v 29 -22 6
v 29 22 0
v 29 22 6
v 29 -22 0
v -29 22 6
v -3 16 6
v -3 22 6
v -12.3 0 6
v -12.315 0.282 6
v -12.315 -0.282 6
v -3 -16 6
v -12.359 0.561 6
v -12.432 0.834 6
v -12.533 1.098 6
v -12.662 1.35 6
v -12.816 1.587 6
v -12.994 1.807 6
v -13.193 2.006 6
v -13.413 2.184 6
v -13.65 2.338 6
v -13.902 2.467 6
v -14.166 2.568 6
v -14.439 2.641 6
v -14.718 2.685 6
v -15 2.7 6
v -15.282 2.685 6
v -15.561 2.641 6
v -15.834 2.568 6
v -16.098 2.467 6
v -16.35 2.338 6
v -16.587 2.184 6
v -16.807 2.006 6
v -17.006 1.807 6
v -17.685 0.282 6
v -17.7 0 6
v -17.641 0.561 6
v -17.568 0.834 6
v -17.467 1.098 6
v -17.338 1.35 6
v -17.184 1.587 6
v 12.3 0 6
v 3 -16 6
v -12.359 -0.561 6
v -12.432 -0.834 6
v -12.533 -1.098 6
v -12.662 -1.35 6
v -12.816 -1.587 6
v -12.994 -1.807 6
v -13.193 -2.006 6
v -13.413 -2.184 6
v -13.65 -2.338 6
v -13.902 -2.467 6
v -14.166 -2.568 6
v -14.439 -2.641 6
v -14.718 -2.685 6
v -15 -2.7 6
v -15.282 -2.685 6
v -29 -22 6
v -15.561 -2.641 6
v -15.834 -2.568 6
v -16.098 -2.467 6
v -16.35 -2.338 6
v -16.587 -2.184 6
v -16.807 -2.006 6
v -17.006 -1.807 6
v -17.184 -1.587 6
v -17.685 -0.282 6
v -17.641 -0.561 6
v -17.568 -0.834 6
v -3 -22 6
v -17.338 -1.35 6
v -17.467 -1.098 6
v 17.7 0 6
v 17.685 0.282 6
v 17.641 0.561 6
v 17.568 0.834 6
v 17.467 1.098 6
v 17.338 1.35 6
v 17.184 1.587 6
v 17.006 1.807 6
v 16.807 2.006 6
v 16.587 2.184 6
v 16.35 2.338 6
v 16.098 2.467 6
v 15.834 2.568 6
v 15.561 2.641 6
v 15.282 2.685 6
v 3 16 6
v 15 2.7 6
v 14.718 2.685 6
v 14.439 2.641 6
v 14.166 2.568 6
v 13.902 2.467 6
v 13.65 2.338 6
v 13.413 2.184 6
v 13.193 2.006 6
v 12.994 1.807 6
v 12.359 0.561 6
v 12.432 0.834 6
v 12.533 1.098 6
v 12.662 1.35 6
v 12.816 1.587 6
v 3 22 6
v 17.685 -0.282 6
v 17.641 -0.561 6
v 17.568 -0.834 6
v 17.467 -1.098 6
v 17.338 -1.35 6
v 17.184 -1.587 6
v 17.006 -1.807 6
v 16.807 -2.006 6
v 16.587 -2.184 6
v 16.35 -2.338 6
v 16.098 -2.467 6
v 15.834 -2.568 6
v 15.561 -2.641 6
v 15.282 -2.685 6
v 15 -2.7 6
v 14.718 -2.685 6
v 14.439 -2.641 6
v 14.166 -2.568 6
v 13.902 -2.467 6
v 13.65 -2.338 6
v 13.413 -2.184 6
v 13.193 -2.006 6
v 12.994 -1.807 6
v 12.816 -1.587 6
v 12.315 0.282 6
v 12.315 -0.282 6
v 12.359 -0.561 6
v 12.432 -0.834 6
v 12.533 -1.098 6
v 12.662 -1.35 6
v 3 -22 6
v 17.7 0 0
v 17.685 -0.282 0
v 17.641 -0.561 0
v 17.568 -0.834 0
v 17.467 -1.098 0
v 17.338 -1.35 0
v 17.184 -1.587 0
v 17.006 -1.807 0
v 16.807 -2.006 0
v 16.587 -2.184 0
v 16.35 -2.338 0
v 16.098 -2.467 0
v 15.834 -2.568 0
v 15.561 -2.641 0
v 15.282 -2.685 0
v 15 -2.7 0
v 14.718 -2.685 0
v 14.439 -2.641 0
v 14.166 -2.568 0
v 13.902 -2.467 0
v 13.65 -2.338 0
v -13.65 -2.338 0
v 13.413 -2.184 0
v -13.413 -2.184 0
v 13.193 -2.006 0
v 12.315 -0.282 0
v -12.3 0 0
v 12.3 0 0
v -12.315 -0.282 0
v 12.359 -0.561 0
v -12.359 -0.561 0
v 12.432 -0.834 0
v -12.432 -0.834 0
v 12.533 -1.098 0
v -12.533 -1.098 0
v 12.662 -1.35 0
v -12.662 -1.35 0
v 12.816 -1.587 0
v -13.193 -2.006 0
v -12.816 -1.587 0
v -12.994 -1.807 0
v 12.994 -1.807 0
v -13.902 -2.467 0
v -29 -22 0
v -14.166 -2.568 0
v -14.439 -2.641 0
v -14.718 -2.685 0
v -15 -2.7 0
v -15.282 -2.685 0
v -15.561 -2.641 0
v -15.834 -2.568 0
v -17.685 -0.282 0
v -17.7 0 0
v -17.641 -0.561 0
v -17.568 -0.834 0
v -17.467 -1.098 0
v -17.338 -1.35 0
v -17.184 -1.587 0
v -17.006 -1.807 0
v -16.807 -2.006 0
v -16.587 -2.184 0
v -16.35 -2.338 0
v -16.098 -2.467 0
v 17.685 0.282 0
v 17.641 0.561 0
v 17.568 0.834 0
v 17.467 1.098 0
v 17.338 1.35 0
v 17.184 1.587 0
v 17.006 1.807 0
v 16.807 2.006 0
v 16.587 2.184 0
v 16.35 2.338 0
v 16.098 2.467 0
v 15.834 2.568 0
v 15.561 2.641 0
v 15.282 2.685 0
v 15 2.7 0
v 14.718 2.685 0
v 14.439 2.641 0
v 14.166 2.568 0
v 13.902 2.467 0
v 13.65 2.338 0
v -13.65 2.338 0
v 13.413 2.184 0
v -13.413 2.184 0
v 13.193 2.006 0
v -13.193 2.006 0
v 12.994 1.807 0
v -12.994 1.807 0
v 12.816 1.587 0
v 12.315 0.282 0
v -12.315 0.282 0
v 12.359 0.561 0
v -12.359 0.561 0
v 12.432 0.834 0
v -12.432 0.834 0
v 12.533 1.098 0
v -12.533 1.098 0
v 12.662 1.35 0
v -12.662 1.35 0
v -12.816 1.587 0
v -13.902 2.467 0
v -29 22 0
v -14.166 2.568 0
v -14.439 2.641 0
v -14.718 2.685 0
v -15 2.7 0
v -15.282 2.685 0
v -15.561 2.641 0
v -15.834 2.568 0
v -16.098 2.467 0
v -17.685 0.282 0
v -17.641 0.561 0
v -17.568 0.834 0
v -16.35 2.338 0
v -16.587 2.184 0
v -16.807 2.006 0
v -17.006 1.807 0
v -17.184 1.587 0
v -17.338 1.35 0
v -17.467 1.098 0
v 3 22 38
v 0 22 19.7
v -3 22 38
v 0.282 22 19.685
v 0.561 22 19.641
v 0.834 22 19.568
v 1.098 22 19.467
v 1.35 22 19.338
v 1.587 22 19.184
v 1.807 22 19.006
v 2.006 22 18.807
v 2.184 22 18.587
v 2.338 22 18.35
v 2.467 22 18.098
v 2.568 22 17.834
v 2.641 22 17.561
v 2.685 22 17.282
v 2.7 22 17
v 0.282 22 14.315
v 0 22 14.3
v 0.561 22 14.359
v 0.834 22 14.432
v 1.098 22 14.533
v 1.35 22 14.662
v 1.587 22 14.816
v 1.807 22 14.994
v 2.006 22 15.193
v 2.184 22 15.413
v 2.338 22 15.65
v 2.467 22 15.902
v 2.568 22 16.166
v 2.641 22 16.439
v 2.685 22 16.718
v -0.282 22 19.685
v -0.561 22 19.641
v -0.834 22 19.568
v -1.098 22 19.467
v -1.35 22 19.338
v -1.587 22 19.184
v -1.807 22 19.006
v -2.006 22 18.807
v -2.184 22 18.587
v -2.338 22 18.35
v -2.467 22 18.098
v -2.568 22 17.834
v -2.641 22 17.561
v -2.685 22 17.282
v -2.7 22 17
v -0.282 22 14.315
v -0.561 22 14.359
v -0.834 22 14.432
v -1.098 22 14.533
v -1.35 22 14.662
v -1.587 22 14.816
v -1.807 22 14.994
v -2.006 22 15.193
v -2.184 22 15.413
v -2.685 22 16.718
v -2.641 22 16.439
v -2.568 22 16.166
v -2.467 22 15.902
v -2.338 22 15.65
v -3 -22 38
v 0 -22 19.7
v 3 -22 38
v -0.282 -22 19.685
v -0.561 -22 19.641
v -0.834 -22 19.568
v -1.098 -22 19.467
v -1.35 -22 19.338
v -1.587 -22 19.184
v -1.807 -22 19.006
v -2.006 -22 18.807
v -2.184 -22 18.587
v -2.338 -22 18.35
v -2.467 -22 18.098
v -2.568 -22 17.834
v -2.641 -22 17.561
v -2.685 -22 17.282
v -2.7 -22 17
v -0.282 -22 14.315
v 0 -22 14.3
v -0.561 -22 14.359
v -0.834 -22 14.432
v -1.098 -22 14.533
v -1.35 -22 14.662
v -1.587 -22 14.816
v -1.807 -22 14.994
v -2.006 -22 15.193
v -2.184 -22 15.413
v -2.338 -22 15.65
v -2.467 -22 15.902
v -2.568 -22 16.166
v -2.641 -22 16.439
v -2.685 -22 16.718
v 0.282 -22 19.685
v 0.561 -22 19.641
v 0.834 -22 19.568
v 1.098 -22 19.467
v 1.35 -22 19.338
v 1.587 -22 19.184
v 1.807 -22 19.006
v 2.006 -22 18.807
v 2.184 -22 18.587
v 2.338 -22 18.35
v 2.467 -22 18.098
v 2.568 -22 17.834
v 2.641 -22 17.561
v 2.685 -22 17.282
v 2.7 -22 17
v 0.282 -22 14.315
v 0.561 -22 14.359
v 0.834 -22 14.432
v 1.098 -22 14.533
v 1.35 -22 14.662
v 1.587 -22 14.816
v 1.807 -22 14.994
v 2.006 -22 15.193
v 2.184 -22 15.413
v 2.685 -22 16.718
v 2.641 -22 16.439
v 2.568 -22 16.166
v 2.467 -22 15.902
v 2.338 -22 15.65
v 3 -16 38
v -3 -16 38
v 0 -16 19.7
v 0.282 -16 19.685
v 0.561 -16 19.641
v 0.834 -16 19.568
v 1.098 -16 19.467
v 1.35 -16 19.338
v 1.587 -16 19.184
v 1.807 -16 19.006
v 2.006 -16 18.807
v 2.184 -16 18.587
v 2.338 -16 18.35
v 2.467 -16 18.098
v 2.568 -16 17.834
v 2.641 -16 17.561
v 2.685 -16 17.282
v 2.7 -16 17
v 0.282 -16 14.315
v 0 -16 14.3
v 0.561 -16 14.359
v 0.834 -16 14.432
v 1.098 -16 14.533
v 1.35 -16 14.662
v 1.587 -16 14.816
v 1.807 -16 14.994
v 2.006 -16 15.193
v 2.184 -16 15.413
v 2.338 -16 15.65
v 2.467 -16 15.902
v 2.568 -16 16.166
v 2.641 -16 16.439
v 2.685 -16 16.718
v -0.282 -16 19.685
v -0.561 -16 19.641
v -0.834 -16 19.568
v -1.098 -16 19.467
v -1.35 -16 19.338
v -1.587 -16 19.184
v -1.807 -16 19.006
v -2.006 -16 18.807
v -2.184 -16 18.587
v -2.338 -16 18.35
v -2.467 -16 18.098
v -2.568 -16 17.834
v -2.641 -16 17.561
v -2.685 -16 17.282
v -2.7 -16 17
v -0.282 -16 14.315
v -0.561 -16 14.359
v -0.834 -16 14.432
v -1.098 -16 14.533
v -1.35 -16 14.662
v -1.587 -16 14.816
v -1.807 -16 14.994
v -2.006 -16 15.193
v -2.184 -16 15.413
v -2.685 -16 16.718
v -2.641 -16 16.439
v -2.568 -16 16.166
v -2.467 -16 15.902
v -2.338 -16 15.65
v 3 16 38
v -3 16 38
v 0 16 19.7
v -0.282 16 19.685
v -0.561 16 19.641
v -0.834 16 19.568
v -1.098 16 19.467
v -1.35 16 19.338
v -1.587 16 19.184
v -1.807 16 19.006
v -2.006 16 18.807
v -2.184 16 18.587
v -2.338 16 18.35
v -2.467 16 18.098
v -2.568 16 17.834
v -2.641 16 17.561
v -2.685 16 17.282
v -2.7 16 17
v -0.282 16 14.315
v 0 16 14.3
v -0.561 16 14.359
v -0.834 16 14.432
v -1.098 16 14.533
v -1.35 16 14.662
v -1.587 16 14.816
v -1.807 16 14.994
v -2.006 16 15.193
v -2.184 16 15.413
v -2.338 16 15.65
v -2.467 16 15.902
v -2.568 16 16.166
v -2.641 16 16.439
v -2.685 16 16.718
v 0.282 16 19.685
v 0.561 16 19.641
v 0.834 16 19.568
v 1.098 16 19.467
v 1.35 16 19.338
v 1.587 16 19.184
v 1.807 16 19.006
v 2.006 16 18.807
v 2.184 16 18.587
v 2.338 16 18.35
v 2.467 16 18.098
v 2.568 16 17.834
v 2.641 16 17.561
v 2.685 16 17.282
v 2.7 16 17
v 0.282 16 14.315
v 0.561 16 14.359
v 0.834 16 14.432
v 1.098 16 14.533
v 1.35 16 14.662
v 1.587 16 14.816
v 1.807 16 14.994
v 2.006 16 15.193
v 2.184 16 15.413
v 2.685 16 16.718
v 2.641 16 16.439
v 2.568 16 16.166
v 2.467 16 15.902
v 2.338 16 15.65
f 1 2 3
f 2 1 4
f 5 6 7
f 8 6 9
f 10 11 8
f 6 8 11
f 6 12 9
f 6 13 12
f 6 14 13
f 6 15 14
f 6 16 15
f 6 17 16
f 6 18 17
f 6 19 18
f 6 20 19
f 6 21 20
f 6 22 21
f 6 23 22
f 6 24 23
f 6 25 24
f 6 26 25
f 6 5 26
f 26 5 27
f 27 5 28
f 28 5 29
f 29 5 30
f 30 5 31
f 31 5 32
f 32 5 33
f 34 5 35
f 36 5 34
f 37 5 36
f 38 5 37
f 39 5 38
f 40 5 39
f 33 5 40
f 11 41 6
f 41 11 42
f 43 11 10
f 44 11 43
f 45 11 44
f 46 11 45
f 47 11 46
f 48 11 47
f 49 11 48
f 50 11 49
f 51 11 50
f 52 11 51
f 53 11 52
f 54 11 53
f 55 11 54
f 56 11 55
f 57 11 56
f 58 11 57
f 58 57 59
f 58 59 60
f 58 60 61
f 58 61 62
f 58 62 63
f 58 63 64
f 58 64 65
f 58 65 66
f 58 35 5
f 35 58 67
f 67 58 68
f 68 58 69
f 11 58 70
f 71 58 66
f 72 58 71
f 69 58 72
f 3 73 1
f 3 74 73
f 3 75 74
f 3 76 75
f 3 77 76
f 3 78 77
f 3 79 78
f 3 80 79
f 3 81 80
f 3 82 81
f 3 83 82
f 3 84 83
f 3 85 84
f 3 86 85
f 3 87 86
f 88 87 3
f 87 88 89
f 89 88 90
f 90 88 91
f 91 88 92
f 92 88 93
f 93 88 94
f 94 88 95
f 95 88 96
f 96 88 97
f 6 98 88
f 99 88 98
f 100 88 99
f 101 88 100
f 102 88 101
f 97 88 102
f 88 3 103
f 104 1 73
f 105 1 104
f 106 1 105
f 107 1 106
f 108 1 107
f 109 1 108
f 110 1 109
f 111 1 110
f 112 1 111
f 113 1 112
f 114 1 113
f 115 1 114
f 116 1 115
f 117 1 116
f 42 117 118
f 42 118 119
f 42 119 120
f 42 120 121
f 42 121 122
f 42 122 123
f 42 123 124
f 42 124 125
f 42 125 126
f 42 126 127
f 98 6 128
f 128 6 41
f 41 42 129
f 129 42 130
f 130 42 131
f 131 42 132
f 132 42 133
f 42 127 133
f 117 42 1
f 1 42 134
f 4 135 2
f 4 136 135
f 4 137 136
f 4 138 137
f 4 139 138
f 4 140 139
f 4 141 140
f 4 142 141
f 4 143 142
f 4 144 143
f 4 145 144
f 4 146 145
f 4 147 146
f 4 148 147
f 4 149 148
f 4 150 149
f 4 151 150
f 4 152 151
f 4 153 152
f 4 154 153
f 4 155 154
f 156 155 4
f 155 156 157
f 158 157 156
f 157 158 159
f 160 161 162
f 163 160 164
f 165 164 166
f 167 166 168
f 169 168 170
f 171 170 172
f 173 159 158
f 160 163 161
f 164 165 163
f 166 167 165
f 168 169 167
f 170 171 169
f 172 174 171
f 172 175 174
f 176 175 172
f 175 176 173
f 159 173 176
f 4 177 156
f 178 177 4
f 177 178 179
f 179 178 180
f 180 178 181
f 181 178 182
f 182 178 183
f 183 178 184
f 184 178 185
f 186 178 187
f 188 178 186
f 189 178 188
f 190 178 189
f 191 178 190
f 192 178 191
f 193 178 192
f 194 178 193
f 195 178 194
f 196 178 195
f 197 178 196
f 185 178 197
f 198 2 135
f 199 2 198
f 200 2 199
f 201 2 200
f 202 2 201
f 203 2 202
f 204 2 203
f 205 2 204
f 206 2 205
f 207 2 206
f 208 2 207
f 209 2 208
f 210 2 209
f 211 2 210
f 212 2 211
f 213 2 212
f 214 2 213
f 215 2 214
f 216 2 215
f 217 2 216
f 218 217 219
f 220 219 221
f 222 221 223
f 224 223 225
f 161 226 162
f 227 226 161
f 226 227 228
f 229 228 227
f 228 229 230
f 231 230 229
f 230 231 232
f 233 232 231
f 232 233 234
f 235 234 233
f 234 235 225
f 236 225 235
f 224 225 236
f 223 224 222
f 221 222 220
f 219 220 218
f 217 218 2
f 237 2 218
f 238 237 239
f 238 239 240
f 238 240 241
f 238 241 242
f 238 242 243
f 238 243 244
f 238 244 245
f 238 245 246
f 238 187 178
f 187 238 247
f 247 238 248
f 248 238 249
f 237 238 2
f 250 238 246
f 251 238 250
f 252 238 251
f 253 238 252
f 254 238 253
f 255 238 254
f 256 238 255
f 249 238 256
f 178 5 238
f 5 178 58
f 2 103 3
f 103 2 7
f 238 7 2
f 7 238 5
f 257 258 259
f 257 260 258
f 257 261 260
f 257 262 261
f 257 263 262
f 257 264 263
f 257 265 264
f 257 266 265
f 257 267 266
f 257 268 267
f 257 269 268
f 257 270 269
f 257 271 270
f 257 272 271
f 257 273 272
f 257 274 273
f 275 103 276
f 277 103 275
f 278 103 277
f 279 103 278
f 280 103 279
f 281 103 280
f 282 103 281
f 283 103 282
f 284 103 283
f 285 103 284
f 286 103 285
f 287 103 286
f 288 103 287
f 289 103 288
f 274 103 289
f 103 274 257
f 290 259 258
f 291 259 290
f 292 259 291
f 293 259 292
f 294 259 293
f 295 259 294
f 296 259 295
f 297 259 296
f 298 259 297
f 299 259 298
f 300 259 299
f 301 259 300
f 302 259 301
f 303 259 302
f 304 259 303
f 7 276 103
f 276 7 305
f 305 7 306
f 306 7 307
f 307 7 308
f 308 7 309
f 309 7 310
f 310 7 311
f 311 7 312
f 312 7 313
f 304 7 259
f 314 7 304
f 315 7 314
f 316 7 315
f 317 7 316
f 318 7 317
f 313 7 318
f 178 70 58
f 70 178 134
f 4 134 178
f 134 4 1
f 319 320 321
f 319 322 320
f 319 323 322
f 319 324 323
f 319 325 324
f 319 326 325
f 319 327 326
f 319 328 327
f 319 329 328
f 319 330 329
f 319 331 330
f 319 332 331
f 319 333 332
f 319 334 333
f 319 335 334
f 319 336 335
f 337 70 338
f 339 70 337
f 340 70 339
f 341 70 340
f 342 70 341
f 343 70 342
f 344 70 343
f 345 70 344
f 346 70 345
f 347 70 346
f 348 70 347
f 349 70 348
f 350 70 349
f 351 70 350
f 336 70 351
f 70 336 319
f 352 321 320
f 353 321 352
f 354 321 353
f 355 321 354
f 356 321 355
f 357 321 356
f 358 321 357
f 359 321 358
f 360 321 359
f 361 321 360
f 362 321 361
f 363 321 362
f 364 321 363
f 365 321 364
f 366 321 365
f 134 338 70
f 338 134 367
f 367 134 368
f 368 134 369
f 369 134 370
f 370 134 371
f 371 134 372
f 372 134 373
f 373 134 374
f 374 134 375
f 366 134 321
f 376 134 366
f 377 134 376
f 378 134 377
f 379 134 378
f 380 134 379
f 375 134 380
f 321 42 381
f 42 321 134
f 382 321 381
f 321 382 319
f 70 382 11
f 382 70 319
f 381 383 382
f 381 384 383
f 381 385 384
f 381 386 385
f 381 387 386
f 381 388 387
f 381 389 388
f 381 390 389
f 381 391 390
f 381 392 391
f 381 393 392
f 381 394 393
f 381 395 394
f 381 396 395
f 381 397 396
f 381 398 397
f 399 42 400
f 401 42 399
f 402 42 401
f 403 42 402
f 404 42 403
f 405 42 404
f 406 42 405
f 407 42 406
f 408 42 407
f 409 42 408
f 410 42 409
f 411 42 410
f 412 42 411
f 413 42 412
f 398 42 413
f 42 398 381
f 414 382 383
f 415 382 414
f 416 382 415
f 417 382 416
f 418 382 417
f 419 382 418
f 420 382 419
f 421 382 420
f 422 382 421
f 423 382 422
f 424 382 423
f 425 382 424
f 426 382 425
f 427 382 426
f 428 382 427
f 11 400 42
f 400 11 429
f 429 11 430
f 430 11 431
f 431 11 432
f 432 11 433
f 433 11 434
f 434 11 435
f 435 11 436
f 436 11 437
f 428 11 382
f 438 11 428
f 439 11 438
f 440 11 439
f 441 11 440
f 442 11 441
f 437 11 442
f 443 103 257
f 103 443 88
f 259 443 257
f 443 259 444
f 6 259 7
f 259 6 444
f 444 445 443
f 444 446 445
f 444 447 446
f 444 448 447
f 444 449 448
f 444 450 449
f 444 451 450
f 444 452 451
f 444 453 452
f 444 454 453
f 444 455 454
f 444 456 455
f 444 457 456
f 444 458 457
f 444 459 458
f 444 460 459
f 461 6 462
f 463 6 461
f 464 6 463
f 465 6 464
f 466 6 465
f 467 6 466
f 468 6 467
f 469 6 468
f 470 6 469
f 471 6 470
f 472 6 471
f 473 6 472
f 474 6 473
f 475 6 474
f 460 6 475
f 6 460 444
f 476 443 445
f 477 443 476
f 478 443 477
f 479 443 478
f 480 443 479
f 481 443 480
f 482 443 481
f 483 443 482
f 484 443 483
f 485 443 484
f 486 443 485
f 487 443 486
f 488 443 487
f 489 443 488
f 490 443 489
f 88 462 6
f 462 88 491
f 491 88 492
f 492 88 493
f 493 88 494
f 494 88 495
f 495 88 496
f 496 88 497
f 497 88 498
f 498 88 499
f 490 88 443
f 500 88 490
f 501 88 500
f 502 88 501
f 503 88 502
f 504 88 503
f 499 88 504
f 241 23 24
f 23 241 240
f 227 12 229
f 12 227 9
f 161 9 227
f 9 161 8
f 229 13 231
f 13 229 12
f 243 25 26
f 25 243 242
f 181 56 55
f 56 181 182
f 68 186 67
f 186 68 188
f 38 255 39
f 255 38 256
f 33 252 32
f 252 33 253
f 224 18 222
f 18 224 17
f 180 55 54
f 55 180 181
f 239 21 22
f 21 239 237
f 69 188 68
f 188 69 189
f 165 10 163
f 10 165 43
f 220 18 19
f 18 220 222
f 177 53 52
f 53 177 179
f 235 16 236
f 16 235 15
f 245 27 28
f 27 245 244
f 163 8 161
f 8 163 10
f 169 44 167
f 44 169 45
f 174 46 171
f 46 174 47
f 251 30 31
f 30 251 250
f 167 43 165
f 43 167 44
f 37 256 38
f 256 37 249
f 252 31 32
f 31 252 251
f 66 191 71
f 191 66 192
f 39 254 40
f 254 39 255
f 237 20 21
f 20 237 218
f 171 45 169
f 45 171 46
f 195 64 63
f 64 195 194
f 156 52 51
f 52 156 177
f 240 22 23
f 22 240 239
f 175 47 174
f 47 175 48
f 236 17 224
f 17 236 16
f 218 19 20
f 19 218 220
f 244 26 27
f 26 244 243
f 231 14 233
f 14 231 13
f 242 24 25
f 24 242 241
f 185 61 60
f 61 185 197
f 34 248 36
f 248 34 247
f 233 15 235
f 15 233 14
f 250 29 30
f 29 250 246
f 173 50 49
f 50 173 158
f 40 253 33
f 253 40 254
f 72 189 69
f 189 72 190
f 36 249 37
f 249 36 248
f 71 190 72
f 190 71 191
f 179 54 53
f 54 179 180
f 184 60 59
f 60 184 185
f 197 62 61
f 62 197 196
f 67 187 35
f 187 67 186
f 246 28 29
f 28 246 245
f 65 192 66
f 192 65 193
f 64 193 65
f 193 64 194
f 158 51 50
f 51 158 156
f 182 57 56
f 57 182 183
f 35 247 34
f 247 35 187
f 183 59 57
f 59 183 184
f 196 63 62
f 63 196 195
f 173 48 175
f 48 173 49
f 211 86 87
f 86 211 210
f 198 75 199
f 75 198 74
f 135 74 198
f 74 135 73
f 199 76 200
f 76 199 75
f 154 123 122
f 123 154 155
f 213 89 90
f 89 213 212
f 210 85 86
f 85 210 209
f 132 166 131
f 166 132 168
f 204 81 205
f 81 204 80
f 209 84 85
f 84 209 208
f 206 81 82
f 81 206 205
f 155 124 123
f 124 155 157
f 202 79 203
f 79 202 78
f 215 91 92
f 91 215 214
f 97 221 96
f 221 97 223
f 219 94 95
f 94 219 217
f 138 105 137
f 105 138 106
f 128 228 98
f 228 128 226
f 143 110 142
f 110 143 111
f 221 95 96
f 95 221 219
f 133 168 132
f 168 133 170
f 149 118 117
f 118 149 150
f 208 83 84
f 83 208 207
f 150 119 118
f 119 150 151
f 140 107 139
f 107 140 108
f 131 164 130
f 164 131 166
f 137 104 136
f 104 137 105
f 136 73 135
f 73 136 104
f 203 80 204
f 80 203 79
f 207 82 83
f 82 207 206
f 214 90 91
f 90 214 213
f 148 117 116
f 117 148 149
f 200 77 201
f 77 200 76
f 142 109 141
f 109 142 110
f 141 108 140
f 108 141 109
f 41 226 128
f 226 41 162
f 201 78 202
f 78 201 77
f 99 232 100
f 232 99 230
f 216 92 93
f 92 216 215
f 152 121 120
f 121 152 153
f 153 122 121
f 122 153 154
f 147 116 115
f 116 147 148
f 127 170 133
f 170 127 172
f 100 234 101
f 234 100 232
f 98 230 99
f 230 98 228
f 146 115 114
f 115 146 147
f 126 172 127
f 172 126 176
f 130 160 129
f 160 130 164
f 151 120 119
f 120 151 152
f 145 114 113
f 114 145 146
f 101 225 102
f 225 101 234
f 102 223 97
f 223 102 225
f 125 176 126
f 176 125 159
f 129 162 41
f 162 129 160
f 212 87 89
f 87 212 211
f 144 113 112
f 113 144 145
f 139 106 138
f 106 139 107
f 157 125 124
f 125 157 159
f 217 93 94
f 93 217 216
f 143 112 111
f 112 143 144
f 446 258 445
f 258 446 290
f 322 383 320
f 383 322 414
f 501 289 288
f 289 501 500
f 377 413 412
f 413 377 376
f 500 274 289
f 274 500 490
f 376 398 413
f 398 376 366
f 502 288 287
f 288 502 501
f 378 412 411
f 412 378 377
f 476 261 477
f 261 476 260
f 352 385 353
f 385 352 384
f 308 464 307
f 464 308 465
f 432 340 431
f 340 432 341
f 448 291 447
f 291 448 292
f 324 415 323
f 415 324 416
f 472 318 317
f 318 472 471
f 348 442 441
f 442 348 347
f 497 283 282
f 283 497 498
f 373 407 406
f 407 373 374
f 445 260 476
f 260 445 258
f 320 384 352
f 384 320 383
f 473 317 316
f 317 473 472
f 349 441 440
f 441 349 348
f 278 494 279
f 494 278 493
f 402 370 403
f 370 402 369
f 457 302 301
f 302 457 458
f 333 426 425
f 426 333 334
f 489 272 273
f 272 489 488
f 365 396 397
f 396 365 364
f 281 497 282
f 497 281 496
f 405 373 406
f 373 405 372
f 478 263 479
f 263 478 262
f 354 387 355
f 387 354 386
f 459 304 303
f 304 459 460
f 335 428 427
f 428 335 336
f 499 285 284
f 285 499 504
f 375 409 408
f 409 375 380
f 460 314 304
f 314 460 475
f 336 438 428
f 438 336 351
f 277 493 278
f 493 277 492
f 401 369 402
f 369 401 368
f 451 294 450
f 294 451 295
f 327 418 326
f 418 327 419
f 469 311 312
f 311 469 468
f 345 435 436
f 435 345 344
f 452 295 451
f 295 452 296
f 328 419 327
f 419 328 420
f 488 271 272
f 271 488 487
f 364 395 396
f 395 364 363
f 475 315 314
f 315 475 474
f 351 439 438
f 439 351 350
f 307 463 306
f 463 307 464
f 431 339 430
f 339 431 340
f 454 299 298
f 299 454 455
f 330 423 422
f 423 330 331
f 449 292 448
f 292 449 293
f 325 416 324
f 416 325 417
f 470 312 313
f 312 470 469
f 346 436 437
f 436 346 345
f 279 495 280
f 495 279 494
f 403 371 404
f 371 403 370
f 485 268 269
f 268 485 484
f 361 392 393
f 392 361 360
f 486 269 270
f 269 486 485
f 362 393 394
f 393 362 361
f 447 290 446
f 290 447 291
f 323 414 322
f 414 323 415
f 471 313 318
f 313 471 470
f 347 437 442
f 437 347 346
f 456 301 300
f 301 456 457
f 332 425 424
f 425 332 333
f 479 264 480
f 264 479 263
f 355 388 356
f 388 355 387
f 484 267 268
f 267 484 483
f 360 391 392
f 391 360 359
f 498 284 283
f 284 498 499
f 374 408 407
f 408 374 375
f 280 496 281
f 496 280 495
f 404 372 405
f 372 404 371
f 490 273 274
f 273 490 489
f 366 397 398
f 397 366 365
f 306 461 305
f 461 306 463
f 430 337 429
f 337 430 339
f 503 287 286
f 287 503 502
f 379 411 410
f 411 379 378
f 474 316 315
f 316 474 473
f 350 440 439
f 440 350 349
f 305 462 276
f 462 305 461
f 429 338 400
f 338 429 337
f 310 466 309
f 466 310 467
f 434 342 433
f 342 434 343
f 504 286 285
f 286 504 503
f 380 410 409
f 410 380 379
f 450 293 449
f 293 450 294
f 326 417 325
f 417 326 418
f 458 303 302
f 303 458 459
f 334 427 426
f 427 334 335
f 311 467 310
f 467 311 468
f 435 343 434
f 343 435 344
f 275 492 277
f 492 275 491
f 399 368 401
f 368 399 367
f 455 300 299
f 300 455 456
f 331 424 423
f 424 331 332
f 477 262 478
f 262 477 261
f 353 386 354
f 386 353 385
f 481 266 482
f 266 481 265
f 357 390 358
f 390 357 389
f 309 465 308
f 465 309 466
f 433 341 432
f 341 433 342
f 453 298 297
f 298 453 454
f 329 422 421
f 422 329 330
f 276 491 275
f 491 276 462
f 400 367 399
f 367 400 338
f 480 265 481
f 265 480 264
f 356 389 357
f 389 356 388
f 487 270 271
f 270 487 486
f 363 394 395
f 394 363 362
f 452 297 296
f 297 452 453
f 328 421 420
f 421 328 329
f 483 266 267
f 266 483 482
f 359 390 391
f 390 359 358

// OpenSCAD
// Clevis mounting bracket for M5 pin.
$fn = 60;
eps = 0.02;
opening = 32;
ear_h = 34;
base_l = 58;
base_w = opening + 12;
base_t = 6;
ear_t = 6;
difference() {
    union() {
        translate([-base_l / 2, -base_w / 2, 0]) cube([base_l, base_w, base_t]);
        translate([-ear_t / 2, -base_w / 2, base_t - 2]) cube([ear_t, ear_t, ear_h]);
        translate([-ear_t / 2, base_w / 2 - ear_t, base_t - 2]) cube([ear_t, ear_t, ear_h]);
    }
    for (x = [-15, 15]) translate([x, 0, -eps]) cylinder(d = 5.4, h = base_t + 2 * eps);
    translate([0, -base_w / 2 - eps, ear_h / 2]) rotate([-90, 0, 0]) cylinder(d = 5.4, h = base_w + 2 * eps);
}
